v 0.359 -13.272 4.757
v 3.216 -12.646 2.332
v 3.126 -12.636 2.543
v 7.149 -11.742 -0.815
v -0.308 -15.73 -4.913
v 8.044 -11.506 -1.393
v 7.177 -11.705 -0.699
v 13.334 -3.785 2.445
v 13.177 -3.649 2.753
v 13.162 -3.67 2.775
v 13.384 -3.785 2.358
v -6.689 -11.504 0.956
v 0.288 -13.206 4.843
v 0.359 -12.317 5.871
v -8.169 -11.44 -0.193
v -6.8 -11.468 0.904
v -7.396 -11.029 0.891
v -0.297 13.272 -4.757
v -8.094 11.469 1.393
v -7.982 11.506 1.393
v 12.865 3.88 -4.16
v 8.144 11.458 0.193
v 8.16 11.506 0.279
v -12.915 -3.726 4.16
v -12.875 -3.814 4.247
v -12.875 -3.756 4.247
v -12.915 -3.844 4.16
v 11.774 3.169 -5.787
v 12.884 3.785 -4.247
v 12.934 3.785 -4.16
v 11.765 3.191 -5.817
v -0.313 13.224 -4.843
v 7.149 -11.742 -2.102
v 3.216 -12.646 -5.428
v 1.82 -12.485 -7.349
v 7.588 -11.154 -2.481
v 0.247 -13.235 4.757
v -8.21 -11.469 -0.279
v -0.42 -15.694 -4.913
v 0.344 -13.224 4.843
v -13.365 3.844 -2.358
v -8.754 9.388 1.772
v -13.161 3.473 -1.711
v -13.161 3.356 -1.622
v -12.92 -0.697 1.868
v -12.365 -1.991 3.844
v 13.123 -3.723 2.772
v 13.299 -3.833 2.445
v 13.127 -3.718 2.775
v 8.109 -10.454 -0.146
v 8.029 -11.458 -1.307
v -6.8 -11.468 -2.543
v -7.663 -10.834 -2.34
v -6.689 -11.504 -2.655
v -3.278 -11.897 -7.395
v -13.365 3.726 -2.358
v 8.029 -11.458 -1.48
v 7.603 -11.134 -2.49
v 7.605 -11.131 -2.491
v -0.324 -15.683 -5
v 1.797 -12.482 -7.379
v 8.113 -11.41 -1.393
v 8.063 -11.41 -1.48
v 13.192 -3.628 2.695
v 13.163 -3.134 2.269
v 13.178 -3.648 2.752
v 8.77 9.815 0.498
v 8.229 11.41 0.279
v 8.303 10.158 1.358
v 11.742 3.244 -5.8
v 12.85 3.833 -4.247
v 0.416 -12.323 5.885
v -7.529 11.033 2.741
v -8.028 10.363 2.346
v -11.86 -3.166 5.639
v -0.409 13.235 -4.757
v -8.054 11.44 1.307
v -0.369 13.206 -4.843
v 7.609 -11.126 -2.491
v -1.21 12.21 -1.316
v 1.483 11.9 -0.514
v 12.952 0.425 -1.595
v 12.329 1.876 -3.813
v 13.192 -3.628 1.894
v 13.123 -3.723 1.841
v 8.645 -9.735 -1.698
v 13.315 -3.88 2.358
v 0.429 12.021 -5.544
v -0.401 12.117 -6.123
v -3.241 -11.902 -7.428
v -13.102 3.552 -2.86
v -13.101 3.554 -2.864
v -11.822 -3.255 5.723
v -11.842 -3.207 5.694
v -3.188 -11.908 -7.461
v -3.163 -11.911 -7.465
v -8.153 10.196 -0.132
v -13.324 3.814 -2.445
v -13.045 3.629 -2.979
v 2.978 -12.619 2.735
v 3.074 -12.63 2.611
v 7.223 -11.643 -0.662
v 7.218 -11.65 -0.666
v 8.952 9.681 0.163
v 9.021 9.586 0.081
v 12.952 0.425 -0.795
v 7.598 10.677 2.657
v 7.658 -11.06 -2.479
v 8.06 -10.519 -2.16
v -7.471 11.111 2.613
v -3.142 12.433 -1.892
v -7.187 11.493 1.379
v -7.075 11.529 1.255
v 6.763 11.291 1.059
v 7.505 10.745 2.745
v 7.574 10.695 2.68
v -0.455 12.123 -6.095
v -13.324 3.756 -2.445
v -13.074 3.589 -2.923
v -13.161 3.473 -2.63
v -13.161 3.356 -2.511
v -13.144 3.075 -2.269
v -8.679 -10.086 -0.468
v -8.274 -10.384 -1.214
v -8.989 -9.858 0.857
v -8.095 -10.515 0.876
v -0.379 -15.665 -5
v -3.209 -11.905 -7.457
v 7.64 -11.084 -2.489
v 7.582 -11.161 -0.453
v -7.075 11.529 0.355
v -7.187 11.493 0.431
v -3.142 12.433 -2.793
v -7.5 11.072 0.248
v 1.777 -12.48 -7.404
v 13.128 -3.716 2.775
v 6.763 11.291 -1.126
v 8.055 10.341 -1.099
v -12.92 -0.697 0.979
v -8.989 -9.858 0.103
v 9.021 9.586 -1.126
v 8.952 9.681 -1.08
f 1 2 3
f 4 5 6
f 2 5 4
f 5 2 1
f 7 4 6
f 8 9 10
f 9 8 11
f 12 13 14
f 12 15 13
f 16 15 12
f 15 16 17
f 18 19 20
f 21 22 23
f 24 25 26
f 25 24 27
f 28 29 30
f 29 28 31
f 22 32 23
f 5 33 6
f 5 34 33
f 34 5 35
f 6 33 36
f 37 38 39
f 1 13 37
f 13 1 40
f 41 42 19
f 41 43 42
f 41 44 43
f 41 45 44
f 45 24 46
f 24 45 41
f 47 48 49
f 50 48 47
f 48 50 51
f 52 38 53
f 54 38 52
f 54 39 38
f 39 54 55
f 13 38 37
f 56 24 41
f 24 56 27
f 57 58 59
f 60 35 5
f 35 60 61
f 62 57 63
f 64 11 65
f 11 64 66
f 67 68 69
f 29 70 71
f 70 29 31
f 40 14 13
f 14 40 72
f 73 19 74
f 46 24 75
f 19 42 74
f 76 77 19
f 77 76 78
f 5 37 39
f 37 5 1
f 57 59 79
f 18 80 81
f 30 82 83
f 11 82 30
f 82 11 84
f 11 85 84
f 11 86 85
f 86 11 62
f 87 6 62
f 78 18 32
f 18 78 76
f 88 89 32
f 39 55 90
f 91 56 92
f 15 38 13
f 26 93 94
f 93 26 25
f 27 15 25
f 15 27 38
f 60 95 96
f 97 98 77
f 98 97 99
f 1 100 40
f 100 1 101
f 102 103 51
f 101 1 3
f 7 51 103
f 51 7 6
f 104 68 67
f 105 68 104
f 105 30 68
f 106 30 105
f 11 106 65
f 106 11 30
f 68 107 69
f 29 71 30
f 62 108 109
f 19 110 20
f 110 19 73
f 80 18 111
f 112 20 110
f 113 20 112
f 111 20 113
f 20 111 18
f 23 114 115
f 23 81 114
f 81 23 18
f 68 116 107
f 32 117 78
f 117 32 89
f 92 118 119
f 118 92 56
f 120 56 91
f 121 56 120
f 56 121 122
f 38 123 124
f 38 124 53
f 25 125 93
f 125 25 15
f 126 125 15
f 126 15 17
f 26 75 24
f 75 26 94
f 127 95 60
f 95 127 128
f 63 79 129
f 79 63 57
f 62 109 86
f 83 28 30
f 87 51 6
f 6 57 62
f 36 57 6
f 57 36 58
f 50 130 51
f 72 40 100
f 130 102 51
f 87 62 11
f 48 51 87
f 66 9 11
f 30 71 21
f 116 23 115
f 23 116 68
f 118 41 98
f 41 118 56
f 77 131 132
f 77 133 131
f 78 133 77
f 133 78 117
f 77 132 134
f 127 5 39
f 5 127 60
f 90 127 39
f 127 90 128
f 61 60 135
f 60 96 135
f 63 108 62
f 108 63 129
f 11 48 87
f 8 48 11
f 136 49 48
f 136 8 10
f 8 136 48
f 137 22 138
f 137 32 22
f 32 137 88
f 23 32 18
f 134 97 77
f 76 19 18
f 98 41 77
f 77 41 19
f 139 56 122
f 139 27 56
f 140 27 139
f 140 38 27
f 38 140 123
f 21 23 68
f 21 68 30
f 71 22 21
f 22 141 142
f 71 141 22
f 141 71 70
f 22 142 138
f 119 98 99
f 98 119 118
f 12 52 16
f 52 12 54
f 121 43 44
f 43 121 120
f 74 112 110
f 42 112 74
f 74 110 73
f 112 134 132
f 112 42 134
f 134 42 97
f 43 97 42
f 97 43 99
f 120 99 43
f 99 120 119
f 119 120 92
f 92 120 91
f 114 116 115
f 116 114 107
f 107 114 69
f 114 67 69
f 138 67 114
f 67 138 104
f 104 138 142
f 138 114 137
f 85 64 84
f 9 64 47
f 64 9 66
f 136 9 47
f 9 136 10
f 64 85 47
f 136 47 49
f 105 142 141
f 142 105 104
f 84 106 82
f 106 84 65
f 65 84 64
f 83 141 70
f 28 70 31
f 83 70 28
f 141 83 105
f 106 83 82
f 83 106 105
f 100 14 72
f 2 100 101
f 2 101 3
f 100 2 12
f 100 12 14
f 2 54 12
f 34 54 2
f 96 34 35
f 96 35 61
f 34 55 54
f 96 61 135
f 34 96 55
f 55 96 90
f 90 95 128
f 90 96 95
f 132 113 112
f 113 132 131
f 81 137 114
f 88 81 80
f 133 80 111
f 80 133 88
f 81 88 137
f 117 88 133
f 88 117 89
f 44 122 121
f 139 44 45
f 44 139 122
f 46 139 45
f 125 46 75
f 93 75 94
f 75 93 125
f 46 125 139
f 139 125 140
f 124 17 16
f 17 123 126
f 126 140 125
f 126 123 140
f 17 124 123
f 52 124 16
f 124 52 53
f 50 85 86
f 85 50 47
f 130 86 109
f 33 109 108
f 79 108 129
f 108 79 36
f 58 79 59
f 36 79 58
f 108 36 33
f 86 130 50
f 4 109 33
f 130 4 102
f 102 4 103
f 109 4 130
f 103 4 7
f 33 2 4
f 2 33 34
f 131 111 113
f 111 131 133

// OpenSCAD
// Auto-generated OpenSCAD file

    inner_points = 10*[[0.0998930354475761, -0.08761839771919257, 1.3956184279718415], [0.6728697039772034, -0.5090233371692008, -1.1239485150914914], [-0.6716026362296299, 0.487698807845633, 1.1239485150914914], [-0.0986259677000027, 0.06629386839562477, -1.3956184279718415], [-0.8908119004872508, -0.979928839088502, 0.47892884316814505], [-0.6719542878696155, -1.1408912029313139, -0.48346009215137703], [0.673221355617189, 1.1195666736077459, 0.48346009215137703], [0.8920789682348242, 0.9586043097649343, -0.47892884316814505], [0.7118307070376008, -1.1647302272134858, 0.35475514127068664], [-1.3079711835867545, 0.3414697712678377, -0.35648592437079285], [1.3092382513343277, -0.36279430059140544, 0.35648592437079285], [-0.7105636392900273, 1.1434056978899179, -0.35475514127068664], [-0.035585740512491165, -0.9946621663535183, 0.9969743473109073], [0.3185333153995008, -1.2551047419607149, -0.5602036604329037], [-1.28389195945964, -0.06377937343702057, 0.5574031945497779], [-0.9297729035476481, -0.3242219490442169, -0.999774813194033], [0.9310399712952215, 0.30289741972064915, 0.999774813194033], [1.2851590272072133, 0.04245484411345278, -0.5574031945497779], [-0.31726624765192735, 1.2337802126371469, 0.5602036604329037], [0.03685280826006457, 0.9733376370299506, -0.9969743473109073], [0.8878158417756826, -0.674182307300777, 1.208213968994985]];

    outer_points = 10*[[0.03282366802055475, -1.3176403726430708, 0.4756805091246931], [-0.08493614308928757, 0.6642367211098263, -1.2308943583788188], [0.08493614308928757, -0.6642367211098263, 1.2308943583788188], [-0.03282366802055475, 1.3176403726430708, -0.4756805091246931], [-1.283421516714085, -0.3785048441443724, 0.4160394031302599], [-1.3284017620492774, 0.3785048441443724, -0.2358141919097333], [1.3284017620492774, -0.3785048441443724, 0.2358141919097333], [1.283421516714085, 0.3785048441443724, -0.4160394031302599], [-0.5670299754236185, -0.8553164840436631, -0.9541678105326641], [-0.43059774445579446, 0.8553164840436631, 1.0230077155892763], [0.43059774445579446, -0.8553164840436631, -1.0230077155892763], [0.5670299754236185, 0.8553164840436631, 0.9541678105326641], [-0.8128678745041953, -1.141048361009117, -0.027927549120190846], [-0.8856474402788453, 0.0838190444550353, -1.0826488215837096], [-0.728548118605104, -0.0838190444550353, 1.194034127747624], [-0.8013276843797541, 1.141048361009117, 0.1393128552841052], [0.8013276843797541, -1.141048361009117, -0.1393128552841052], [0.728548118605104, 0.0838190444550353, -1.194034127747624], [0.8856474402788453, -0.0838190444550353, 1.0826488215837096], [0.8128678745041953, 1.141048361009117, 0.027927549120190846], [-0.033902923914046645, -1.5635173407451266, -0.4913210826453173]];

    // Convex hull for inner set (I)
    module inner_hull() {
        hull() {
            for (p = inner_points) {
                translate(p) sphere(r=0.1);
            }
        }
    }

    // Convex hull for outer set (O) minus inner hull (O \ I)
    module outer_minus_inner() {
        difference() {
            hull() {
                for (p = outer_points) {
                    translate(p) sphere(r=0.1);
                }
            }
            inner_hull(); // Subtract inner hull
        }
    }

    // Convex hull for outer set (O) minus all translated inner hulls
    module outer_minus_AllTranslationInner() {
        difference() {
            hull() {
                for (p = outer_points) {
                    translate(p) sphere(r=0.1);
                }
            }
            hull() {
                translate([0,0,50]) inner_hull();
                translate([0,0,-50]) inner_hull();
            }; // Subtract translated inner hulls
        }
    }

    // Difference between outer_minus_inner and outer_minus_AllTranslationInner
    module outer_minus_inner_diff() {
        difference() {
            // Outer minus inner
            difference() {
                hull() {
                    for (p = outer_points) {
                        translate(p) sphere(r=0.1);
                    }
                }
                inner_hull();
            }

            // Subtract Outer minus AllTranslationInner
            difference() {
                hull() {
                    for (p = outer_points) {
                        translate(p) sphere(r=0.1);
                    }
                }
                hull() {
                    translate([0,0,50]) inner_hull();
                    translate([0,0,-50]) inner_hull();
                };
            }
        }
    }

    // Rendering all with colors applied
    color([0, 1, 0, 1]) outer_minus_AllTranslationInner(); // Opaque green
    
